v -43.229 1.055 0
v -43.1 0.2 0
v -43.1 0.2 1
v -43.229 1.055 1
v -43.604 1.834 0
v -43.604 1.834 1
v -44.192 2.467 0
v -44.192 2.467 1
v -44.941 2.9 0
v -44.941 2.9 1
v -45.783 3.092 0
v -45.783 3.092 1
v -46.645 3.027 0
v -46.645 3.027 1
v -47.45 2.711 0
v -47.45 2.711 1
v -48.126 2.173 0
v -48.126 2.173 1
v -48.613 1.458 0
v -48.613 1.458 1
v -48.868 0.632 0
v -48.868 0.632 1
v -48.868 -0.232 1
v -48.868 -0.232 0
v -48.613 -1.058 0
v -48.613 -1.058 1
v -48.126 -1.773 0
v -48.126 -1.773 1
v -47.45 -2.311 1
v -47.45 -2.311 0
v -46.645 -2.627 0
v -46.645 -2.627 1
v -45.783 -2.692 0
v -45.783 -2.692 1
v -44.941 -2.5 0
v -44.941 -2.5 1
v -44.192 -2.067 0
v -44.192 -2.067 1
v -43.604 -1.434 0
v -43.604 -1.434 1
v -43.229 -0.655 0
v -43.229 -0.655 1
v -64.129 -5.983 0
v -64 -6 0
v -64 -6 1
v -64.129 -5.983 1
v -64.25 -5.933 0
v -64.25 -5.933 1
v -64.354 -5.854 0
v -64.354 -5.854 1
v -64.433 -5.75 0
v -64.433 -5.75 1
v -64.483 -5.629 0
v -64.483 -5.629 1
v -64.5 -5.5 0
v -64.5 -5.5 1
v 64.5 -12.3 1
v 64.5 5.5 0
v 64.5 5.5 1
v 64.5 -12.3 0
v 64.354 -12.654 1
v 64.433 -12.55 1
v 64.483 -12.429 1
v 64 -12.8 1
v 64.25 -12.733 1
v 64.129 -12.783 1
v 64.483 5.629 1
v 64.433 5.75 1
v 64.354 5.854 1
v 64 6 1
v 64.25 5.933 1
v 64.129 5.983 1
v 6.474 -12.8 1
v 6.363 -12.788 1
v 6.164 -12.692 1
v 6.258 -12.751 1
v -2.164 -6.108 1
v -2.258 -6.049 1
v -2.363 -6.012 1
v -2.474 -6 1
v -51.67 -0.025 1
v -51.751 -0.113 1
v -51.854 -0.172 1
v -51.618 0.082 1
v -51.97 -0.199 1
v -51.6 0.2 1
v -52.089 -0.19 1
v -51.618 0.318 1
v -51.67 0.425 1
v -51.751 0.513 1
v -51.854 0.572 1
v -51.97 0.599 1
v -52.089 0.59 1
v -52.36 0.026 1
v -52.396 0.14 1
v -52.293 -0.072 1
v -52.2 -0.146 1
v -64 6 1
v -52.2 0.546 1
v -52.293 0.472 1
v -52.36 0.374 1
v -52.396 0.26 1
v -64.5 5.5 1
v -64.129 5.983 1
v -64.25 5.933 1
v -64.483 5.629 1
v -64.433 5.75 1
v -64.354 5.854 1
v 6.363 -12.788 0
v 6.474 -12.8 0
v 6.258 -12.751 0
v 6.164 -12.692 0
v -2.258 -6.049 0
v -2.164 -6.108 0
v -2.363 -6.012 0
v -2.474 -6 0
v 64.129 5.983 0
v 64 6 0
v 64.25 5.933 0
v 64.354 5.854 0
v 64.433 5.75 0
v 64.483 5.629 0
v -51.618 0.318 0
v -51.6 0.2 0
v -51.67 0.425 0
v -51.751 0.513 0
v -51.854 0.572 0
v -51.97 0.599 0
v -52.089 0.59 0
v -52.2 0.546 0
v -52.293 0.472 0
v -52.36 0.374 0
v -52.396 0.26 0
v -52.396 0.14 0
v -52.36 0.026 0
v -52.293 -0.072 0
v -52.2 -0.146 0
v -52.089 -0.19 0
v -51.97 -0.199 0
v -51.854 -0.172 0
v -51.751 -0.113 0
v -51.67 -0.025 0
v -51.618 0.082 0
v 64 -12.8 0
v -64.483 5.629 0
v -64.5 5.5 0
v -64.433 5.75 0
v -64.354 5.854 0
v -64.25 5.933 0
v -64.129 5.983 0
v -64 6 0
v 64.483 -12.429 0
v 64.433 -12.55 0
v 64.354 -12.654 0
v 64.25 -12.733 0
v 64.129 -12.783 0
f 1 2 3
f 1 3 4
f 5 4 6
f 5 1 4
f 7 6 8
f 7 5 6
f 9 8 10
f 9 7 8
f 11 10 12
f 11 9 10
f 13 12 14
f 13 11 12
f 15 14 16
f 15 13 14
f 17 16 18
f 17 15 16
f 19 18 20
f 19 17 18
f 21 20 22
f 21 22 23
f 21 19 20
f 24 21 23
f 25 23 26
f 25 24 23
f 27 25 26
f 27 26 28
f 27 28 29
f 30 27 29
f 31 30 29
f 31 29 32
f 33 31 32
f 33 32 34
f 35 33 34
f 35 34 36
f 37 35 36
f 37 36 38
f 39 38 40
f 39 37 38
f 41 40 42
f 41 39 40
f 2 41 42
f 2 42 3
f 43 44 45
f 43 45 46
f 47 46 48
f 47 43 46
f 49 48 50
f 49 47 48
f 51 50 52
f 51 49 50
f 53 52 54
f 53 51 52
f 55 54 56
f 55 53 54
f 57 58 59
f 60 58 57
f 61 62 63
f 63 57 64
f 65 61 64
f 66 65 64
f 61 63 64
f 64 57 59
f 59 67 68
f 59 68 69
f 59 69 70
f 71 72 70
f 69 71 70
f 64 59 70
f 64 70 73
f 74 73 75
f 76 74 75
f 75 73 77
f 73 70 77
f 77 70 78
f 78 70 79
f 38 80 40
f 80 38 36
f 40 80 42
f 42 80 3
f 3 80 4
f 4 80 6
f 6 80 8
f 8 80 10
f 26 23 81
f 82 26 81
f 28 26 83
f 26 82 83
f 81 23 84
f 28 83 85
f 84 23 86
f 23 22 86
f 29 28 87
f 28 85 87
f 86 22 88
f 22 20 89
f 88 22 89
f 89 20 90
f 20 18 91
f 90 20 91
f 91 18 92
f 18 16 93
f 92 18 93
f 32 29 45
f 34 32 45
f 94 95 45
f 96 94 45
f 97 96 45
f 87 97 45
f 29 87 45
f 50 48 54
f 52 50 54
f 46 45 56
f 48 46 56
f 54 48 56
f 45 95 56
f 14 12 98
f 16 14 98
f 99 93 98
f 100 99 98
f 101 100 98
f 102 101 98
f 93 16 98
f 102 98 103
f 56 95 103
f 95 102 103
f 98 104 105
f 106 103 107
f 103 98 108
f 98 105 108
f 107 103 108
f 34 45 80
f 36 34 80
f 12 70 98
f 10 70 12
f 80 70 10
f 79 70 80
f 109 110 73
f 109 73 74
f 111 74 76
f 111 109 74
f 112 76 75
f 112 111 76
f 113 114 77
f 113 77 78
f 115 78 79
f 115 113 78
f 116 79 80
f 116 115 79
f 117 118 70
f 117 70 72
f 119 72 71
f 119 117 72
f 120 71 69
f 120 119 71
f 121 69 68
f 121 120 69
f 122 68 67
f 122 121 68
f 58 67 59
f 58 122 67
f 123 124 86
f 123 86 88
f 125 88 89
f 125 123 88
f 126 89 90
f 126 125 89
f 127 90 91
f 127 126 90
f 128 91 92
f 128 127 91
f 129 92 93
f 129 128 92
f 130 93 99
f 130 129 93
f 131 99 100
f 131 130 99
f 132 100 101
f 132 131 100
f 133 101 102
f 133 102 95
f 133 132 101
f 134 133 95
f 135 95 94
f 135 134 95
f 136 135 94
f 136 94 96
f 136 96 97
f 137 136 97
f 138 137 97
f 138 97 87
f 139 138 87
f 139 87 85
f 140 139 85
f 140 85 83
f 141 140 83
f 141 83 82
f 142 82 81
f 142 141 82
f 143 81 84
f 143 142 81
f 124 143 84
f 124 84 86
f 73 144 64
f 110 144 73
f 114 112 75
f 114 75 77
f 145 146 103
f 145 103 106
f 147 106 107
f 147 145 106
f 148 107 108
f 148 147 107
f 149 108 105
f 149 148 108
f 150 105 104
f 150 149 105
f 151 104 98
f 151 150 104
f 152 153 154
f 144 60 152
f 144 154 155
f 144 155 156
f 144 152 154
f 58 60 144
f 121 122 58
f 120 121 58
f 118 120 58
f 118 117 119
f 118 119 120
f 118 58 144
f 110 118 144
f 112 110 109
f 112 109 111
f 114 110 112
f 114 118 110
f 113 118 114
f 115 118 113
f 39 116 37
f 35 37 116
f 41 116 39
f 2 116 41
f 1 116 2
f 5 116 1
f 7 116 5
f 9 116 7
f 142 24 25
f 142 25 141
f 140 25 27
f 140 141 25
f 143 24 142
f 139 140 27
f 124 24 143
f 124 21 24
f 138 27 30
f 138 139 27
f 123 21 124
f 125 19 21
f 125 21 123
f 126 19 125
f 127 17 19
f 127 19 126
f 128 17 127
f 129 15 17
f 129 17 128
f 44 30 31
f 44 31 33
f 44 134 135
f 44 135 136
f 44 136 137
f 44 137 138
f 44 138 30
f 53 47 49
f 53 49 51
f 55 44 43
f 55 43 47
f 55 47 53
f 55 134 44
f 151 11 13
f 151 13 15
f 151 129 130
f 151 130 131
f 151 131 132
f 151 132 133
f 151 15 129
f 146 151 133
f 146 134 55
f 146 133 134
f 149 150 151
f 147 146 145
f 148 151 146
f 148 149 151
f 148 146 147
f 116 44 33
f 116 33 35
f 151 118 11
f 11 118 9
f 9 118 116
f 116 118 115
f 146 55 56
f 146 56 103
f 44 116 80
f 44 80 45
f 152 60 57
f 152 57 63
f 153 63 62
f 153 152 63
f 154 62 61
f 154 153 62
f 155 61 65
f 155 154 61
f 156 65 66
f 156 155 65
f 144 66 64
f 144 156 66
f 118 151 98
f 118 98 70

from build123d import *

# Parameters (mm, degrees)
SKETCH_1_R      = 2.9
SKETCH_1_R_2    = 0.4
EXTRUDE_1_DEPTH = 1


with BuildPart() as part:
    # Эскиз1 → Бобышка-Вытянуть1 (new body)
    with BuildSketch(Plane.XY):
        with BuildLine():
            Line((6.163674565, -12.692207796), (-2.163674565, -6.107792204))
            ThreePointArc((-2.163674565, -6.107792204), (-2.309633742, -6.027716241), (-2.473792357, -6))
            Line((-2.473792357, -6), (-64, -6))
            ThreePointArc((-64, -6), (-64.353553391, -5.853553391), (-64.5, -5.5))
            Line((-64.5, -5.5), (-64.5, 5.5))
            ThreePointArc((-64.5, 5.5), (-64.353553391, 5.853553391), (-64, 6))
            Line((-64, 6), (64, 6))
            ThreePointArc((64, 6), (64.353553391, 5.853553391), (64.5, 5.5))
            Line((64.5, 5.5), (64.5, -6))
            Line((64.5, -6), (64.5, -12.3))
            ThreePointArc((64.5, -12.3), (64.353553391, -12.653553391), (64, -12.8))
            Line((64, -12.8), (6.473792357, -12.8))
            ThreePointArc((6.473792357, -12.8), (6.309633742, -12.772283759), (6.163674565, -12.692207796))
        make_face()
        with Locations((-46, 0.2)):
            Circle(SKETCH_1_R, mode=Mode.SUBTRACT)
        with Locations((-52, 0.2)):
            Circle(SKETCH_1_R_2, mode=Mode.SUBTRACT)
    extrude(amount=EXTRUDE_1_DEPTH)


solid = part.part
